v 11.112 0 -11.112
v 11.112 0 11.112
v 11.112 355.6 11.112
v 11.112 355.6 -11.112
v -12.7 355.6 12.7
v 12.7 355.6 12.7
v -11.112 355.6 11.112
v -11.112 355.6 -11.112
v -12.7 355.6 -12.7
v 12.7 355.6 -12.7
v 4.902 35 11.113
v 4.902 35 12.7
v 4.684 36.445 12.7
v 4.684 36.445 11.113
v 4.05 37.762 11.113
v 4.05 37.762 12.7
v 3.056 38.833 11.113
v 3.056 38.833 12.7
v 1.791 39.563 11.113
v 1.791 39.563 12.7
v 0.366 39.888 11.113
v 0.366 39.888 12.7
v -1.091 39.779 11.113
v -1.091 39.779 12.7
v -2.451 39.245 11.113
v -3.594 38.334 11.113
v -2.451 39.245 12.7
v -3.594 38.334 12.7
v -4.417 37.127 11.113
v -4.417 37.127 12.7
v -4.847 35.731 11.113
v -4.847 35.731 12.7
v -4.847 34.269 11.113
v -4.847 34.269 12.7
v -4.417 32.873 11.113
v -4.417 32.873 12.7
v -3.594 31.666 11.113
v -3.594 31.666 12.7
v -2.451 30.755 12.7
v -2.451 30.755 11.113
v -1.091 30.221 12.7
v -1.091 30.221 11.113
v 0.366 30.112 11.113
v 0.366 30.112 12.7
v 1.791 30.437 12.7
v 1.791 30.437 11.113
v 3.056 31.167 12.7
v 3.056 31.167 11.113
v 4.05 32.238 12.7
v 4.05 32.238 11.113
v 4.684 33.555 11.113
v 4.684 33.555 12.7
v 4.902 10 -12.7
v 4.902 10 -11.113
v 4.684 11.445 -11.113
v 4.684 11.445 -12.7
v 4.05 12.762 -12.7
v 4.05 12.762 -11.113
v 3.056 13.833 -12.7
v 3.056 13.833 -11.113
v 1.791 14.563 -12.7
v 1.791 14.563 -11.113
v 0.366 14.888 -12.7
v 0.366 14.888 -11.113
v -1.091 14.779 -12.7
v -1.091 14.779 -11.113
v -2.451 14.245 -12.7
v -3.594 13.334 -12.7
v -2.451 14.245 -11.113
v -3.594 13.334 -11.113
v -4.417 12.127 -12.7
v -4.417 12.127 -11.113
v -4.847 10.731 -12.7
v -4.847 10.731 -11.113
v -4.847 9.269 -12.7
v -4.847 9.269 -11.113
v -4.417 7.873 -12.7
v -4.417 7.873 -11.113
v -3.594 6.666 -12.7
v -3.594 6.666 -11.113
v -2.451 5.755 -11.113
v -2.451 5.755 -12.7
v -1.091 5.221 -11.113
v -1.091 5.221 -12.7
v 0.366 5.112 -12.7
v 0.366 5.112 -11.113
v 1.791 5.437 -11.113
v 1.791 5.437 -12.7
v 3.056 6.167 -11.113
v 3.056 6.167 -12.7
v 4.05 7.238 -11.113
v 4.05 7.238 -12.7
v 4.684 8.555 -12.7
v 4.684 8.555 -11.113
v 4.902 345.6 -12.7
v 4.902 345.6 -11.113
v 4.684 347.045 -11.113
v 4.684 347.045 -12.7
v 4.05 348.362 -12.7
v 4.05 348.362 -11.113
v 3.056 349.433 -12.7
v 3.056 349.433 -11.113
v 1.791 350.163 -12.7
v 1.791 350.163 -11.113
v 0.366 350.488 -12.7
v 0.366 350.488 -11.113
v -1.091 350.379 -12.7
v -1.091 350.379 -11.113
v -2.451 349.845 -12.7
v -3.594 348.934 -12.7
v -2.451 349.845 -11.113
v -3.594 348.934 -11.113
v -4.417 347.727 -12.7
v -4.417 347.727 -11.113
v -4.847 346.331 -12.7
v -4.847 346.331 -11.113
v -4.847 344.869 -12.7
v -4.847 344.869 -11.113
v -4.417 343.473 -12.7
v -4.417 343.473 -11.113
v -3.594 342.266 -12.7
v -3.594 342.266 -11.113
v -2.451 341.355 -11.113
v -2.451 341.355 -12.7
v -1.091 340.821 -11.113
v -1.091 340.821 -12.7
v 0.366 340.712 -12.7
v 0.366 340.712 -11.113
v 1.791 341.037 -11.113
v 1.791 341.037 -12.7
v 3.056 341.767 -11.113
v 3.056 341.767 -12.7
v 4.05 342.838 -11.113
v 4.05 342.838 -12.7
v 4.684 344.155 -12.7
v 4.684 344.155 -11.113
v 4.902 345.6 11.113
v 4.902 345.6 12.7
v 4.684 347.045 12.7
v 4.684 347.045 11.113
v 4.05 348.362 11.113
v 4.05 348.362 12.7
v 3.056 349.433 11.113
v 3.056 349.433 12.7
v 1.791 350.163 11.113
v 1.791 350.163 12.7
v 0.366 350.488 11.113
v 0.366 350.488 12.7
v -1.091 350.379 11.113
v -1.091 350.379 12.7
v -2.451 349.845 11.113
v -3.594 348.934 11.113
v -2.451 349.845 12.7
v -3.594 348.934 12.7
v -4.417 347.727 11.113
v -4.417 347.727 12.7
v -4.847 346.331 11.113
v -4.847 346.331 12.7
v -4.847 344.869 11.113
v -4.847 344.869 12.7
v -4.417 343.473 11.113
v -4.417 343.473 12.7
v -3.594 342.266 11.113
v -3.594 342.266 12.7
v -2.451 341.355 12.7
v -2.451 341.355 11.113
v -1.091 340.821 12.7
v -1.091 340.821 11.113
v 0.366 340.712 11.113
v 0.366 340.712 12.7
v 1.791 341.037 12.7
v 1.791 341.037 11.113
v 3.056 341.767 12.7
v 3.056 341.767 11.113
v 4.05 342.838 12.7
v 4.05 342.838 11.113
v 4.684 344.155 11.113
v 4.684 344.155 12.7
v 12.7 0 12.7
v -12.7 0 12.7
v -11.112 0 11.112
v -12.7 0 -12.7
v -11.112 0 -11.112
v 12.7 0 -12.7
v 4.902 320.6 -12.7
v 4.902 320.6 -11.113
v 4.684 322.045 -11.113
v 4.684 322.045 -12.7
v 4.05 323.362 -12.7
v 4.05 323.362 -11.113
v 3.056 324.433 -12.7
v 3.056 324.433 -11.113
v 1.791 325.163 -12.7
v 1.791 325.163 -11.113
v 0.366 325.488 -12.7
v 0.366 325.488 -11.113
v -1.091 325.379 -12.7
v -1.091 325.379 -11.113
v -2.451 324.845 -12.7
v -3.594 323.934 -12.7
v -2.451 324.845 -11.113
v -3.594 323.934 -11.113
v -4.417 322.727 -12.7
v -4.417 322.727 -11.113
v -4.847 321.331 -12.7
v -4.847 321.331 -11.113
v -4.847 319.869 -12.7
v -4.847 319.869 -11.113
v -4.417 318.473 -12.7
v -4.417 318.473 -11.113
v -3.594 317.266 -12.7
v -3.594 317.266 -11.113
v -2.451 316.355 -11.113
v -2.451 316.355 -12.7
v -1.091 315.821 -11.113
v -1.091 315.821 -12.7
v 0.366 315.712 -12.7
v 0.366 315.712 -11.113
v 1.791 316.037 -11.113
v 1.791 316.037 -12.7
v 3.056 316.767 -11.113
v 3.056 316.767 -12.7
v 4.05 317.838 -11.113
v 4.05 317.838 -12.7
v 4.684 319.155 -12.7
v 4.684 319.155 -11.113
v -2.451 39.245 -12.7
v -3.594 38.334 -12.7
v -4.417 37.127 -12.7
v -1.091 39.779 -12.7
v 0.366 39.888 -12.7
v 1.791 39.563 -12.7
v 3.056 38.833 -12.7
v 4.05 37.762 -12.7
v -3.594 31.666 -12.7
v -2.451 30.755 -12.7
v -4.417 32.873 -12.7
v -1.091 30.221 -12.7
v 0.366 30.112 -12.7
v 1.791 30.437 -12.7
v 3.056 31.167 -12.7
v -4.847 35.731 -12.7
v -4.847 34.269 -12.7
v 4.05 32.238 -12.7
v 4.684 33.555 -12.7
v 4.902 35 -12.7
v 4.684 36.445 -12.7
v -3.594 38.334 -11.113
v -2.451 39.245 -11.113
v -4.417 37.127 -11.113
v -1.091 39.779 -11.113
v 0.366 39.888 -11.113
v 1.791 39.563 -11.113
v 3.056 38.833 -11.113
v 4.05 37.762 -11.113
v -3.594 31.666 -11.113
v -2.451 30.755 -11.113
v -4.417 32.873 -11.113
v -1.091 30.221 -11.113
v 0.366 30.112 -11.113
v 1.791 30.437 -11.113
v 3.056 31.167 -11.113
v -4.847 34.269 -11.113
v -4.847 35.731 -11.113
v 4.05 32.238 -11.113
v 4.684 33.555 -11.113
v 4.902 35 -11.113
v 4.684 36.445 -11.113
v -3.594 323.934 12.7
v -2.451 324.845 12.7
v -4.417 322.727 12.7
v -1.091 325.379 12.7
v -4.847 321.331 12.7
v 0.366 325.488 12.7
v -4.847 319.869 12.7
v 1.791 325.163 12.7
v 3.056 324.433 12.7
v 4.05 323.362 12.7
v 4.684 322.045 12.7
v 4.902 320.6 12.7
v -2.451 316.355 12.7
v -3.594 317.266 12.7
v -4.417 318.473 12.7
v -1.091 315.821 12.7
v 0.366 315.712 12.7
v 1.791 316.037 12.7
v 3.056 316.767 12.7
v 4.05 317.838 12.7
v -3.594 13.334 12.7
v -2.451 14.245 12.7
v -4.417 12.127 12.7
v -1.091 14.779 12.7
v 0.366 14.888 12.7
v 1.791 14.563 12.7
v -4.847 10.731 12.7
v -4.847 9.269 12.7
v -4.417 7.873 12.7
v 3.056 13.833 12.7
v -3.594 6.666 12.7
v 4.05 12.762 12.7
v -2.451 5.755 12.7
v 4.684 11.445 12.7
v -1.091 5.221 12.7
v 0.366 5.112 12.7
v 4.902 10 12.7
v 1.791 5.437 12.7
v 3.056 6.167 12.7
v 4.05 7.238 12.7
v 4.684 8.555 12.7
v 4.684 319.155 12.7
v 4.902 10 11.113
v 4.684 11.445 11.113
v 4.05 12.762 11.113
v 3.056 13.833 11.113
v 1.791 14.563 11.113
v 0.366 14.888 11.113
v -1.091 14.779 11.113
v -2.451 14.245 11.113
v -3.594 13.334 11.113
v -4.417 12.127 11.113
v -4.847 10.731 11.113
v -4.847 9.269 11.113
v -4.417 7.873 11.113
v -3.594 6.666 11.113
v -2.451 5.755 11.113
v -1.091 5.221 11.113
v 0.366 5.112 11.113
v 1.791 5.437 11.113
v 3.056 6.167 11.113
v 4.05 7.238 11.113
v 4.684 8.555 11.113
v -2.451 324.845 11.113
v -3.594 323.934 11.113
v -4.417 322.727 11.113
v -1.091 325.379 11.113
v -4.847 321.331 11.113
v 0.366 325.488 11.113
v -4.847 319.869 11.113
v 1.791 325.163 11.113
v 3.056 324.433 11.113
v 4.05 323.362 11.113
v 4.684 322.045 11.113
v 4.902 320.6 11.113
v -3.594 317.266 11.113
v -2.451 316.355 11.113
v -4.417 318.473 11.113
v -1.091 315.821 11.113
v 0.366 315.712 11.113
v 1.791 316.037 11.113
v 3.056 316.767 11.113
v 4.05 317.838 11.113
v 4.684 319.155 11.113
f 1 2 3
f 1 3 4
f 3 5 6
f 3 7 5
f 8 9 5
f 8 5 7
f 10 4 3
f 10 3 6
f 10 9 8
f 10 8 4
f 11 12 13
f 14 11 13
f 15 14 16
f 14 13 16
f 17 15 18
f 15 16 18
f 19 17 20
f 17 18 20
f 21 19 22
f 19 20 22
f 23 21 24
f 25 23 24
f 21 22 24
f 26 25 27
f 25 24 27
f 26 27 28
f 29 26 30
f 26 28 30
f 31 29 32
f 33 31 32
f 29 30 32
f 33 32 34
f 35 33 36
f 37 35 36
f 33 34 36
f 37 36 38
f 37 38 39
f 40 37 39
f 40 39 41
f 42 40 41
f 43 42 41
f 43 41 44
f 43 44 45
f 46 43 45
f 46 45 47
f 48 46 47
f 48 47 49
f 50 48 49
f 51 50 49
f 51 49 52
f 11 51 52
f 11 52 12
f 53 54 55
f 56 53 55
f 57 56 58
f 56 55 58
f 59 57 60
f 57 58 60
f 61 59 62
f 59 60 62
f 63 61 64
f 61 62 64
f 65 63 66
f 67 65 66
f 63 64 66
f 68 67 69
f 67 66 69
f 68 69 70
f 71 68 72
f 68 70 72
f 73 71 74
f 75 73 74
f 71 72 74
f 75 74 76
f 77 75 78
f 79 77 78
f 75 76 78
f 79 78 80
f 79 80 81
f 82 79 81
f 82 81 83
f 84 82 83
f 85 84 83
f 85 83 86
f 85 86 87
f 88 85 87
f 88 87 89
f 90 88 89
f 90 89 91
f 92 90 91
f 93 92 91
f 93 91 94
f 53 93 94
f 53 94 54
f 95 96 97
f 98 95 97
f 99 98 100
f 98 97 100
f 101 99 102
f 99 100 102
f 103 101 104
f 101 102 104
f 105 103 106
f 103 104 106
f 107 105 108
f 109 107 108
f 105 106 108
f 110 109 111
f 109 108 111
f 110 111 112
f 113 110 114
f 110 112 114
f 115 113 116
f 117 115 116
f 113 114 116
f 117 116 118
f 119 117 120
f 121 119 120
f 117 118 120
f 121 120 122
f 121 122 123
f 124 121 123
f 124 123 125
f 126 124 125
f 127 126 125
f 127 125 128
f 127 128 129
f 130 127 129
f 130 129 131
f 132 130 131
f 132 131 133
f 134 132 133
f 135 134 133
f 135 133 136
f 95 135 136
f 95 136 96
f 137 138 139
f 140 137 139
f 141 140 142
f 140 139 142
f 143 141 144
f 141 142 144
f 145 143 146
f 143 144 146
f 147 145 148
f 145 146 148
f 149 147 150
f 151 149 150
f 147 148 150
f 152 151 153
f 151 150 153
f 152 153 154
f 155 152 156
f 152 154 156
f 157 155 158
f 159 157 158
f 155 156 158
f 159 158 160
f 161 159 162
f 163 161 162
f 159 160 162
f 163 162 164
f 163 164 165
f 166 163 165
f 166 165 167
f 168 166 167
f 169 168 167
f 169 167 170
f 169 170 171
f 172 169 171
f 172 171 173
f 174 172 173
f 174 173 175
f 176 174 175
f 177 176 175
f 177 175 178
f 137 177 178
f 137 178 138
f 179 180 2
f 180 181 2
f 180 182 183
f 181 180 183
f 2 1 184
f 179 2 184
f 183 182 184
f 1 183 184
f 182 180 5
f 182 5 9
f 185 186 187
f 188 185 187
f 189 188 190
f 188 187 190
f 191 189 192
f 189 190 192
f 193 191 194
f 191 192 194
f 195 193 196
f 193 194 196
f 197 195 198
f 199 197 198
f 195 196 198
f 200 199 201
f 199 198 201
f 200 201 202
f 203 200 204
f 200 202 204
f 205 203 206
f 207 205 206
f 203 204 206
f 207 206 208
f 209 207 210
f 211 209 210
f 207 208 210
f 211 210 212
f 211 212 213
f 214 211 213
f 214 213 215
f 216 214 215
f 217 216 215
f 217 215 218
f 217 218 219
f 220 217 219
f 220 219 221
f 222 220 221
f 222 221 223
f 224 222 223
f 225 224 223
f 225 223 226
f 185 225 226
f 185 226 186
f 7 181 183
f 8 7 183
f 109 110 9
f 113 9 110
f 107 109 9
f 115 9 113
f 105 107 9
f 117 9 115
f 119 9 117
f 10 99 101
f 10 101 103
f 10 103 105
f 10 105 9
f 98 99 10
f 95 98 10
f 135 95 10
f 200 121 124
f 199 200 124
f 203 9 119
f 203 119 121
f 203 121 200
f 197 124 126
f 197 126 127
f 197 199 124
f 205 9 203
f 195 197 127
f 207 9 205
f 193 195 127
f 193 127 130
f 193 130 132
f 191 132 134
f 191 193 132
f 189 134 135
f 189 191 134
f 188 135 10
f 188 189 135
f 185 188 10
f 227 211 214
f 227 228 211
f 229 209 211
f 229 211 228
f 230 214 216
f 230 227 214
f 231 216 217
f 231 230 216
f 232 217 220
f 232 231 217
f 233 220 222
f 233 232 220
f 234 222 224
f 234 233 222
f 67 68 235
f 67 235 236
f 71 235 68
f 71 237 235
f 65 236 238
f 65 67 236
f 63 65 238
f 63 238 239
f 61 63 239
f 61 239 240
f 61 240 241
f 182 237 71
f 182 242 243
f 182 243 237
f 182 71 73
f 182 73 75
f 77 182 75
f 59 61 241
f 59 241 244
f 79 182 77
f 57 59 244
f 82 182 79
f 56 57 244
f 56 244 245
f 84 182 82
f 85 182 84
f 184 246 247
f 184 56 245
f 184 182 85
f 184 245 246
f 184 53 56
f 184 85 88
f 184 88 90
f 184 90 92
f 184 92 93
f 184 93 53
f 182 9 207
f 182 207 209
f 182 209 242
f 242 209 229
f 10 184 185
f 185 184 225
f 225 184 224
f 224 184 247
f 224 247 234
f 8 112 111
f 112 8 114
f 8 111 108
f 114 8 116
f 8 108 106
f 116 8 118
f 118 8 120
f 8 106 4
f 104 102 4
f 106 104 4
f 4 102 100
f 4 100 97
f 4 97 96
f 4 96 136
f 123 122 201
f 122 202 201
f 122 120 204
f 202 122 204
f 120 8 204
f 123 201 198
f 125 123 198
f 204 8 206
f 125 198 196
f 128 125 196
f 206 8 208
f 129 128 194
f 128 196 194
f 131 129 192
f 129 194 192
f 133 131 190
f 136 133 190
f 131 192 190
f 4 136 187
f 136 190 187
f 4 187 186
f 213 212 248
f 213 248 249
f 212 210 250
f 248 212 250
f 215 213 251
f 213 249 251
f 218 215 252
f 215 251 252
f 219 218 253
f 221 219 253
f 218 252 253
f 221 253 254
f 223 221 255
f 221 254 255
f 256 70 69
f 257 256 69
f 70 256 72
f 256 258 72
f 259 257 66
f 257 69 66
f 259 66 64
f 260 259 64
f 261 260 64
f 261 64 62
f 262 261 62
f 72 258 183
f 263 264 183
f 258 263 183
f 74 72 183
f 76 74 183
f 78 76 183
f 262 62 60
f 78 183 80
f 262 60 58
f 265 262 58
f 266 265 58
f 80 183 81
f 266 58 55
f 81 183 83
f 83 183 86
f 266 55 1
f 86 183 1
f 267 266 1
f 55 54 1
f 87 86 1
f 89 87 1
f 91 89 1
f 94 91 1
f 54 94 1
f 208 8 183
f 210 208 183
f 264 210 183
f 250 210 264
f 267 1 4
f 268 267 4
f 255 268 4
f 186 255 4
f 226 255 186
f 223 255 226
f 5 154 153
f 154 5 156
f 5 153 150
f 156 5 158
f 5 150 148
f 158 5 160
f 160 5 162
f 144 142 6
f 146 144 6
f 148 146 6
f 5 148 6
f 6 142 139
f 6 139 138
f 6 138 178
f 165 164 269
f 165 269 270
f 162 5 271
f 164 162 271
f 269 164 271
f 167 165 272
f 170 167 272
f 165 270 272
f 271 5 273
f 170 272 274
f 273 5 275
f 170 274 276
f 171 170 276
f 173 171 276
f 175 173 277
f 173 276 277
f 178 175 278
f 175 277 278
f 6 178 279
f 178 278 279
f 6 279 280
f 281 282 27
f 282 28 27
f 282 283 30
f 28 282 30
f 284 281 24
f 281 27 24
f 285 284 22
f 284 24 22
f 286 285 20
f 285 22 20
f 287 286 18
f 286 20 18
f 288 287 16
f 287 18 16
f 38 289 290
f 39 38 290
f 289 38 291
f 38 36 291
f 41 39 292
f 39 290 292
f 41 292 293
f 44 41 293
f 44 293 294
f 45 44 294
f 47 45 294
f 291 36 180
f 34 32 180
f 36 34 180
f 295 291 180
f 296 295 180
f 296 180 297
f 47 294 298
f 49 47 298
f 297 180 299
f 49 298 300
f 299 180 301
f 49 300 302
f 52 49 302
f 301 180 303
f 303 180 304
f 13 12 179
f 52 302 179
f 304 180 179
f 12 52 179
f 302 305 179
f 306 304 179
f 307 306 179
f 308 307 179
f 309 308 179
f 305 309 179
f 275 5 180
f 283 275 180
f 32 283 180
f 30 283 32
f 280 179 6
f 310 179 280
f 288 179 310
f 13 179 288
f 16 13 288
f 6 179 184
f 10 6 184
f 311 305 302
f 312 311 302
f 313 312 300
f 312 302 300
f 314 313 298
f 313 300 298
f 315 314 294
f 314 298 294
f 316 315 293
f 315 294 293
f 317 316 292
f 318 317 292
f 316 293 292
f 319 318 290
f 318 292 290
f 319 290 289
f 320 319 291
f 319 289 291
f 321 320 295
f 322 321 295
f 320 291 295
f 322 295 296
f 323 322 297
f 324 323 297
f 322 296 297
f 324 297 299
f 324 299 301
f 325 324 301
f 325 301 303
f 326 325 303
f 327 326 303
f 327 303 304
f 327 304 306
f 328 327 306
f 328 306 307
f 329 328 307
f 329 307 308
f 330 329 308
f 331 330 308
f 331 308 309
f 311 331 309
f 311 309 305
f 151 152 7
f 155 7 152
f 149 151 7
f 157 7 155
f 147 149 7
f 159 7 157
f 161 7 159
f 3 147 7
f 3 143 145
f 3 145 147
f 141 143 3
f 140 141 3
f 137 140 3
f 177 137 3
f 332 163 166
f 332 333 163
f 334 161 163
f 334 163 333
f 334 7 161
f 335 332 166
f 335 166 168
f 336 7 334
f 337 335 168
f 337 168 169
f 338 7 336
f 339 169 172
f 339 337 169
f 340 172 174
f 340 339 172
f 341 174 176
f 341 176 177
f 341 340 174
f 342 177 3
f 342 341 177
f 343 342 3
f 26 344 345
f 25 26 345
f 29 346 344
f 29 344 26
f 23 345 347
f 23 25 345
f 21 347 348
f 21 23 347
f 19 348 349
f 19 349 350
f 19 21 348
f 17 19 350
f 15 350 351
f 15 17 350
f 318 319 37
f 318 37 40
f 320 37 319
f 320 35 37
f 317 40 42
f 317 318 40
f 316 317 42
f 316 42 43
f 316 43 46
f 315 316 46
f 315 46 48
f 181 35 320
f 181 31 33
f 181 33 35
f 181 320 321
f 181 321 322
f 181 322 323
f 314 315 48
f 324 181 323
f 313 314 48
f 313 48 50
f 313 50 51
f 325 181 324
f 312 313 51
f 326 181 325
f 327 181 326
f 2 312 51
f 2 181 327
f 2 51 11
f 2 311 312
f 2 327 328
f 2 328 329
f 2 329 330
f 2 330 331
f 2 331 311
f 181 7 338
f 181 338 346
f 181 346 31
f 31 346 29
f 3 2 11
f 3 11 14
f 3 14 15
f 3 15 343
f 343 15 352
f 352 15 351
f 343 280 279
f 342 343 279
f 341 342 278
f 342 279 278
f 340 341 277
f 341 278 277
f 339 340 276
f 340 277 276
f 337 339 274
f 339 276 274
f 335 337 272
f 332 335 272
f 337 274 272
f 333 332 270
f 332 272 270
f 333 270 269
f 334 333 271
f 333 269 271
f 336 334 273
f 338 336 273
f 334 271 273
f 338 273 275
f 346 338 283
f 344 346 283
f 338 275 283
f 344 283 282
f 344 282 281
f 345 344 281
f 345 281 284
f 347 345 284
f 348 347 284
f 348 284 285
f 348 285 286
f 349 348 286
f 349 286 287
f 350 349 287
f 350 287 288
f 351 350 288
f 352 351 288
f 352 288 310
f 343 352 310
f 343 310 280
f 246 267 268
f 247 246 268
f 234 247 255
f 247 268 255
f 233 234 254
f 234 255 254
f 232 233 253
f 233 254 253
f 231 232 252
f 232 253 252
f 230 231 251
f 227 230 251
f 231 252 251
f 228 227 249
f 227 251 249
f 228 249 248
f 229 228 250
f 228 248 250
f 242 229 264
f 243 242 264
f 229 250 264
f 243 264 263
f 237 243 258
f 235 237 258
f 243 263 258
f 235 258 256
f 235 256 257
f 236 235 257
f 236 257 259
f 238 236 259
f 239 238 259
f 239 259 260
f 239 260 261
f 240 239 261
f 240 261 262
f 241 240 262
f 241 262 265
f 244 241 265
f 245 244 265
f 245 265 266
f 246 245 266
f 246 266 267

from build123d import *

# Parameters (mm, degrees)
SKETCH1_W               = 25.4
SKETCH1_H               = 25.4
SKETCH1_W_2             = 22.225
SKETCH1_H_2             = 22.225
EXTRUDE_THIN1_DEPTH     = 355.6
F_3_8_CLEARANCE_HOLE1_D = 9.8044


with BuildPart() as part:
    # Sketch1 → Extrude-Thin1 (new body)
    with BuildSketch(Plane(origin=(0, 0, 0), x_dir=(1, 0, 0), z_dir=(0, 1, 0))):
        Rectangle(SKETCH1_W, SKETCH1_H)
        Rectangle(SKETCH1_W_2, SKETCH1_H_2, mode=Mode.SUBTRACT)
    extrude(amount=EXTRUDE_THIN1_DEPTH)

    # 3/8 Clearance Hole1 (through all)
    with Locations(Plane(origin=(0, 0, -12.7), x_dir=(-1, 0, 0), z_dir=(0, 0, -1))):
        with Locations((0, 345.6), (0, 320.6), (0, 35), (0, 10)):
            Hole(F_3_8_CLEARANCE_HOLE1_D / 2)


solid = part.part
